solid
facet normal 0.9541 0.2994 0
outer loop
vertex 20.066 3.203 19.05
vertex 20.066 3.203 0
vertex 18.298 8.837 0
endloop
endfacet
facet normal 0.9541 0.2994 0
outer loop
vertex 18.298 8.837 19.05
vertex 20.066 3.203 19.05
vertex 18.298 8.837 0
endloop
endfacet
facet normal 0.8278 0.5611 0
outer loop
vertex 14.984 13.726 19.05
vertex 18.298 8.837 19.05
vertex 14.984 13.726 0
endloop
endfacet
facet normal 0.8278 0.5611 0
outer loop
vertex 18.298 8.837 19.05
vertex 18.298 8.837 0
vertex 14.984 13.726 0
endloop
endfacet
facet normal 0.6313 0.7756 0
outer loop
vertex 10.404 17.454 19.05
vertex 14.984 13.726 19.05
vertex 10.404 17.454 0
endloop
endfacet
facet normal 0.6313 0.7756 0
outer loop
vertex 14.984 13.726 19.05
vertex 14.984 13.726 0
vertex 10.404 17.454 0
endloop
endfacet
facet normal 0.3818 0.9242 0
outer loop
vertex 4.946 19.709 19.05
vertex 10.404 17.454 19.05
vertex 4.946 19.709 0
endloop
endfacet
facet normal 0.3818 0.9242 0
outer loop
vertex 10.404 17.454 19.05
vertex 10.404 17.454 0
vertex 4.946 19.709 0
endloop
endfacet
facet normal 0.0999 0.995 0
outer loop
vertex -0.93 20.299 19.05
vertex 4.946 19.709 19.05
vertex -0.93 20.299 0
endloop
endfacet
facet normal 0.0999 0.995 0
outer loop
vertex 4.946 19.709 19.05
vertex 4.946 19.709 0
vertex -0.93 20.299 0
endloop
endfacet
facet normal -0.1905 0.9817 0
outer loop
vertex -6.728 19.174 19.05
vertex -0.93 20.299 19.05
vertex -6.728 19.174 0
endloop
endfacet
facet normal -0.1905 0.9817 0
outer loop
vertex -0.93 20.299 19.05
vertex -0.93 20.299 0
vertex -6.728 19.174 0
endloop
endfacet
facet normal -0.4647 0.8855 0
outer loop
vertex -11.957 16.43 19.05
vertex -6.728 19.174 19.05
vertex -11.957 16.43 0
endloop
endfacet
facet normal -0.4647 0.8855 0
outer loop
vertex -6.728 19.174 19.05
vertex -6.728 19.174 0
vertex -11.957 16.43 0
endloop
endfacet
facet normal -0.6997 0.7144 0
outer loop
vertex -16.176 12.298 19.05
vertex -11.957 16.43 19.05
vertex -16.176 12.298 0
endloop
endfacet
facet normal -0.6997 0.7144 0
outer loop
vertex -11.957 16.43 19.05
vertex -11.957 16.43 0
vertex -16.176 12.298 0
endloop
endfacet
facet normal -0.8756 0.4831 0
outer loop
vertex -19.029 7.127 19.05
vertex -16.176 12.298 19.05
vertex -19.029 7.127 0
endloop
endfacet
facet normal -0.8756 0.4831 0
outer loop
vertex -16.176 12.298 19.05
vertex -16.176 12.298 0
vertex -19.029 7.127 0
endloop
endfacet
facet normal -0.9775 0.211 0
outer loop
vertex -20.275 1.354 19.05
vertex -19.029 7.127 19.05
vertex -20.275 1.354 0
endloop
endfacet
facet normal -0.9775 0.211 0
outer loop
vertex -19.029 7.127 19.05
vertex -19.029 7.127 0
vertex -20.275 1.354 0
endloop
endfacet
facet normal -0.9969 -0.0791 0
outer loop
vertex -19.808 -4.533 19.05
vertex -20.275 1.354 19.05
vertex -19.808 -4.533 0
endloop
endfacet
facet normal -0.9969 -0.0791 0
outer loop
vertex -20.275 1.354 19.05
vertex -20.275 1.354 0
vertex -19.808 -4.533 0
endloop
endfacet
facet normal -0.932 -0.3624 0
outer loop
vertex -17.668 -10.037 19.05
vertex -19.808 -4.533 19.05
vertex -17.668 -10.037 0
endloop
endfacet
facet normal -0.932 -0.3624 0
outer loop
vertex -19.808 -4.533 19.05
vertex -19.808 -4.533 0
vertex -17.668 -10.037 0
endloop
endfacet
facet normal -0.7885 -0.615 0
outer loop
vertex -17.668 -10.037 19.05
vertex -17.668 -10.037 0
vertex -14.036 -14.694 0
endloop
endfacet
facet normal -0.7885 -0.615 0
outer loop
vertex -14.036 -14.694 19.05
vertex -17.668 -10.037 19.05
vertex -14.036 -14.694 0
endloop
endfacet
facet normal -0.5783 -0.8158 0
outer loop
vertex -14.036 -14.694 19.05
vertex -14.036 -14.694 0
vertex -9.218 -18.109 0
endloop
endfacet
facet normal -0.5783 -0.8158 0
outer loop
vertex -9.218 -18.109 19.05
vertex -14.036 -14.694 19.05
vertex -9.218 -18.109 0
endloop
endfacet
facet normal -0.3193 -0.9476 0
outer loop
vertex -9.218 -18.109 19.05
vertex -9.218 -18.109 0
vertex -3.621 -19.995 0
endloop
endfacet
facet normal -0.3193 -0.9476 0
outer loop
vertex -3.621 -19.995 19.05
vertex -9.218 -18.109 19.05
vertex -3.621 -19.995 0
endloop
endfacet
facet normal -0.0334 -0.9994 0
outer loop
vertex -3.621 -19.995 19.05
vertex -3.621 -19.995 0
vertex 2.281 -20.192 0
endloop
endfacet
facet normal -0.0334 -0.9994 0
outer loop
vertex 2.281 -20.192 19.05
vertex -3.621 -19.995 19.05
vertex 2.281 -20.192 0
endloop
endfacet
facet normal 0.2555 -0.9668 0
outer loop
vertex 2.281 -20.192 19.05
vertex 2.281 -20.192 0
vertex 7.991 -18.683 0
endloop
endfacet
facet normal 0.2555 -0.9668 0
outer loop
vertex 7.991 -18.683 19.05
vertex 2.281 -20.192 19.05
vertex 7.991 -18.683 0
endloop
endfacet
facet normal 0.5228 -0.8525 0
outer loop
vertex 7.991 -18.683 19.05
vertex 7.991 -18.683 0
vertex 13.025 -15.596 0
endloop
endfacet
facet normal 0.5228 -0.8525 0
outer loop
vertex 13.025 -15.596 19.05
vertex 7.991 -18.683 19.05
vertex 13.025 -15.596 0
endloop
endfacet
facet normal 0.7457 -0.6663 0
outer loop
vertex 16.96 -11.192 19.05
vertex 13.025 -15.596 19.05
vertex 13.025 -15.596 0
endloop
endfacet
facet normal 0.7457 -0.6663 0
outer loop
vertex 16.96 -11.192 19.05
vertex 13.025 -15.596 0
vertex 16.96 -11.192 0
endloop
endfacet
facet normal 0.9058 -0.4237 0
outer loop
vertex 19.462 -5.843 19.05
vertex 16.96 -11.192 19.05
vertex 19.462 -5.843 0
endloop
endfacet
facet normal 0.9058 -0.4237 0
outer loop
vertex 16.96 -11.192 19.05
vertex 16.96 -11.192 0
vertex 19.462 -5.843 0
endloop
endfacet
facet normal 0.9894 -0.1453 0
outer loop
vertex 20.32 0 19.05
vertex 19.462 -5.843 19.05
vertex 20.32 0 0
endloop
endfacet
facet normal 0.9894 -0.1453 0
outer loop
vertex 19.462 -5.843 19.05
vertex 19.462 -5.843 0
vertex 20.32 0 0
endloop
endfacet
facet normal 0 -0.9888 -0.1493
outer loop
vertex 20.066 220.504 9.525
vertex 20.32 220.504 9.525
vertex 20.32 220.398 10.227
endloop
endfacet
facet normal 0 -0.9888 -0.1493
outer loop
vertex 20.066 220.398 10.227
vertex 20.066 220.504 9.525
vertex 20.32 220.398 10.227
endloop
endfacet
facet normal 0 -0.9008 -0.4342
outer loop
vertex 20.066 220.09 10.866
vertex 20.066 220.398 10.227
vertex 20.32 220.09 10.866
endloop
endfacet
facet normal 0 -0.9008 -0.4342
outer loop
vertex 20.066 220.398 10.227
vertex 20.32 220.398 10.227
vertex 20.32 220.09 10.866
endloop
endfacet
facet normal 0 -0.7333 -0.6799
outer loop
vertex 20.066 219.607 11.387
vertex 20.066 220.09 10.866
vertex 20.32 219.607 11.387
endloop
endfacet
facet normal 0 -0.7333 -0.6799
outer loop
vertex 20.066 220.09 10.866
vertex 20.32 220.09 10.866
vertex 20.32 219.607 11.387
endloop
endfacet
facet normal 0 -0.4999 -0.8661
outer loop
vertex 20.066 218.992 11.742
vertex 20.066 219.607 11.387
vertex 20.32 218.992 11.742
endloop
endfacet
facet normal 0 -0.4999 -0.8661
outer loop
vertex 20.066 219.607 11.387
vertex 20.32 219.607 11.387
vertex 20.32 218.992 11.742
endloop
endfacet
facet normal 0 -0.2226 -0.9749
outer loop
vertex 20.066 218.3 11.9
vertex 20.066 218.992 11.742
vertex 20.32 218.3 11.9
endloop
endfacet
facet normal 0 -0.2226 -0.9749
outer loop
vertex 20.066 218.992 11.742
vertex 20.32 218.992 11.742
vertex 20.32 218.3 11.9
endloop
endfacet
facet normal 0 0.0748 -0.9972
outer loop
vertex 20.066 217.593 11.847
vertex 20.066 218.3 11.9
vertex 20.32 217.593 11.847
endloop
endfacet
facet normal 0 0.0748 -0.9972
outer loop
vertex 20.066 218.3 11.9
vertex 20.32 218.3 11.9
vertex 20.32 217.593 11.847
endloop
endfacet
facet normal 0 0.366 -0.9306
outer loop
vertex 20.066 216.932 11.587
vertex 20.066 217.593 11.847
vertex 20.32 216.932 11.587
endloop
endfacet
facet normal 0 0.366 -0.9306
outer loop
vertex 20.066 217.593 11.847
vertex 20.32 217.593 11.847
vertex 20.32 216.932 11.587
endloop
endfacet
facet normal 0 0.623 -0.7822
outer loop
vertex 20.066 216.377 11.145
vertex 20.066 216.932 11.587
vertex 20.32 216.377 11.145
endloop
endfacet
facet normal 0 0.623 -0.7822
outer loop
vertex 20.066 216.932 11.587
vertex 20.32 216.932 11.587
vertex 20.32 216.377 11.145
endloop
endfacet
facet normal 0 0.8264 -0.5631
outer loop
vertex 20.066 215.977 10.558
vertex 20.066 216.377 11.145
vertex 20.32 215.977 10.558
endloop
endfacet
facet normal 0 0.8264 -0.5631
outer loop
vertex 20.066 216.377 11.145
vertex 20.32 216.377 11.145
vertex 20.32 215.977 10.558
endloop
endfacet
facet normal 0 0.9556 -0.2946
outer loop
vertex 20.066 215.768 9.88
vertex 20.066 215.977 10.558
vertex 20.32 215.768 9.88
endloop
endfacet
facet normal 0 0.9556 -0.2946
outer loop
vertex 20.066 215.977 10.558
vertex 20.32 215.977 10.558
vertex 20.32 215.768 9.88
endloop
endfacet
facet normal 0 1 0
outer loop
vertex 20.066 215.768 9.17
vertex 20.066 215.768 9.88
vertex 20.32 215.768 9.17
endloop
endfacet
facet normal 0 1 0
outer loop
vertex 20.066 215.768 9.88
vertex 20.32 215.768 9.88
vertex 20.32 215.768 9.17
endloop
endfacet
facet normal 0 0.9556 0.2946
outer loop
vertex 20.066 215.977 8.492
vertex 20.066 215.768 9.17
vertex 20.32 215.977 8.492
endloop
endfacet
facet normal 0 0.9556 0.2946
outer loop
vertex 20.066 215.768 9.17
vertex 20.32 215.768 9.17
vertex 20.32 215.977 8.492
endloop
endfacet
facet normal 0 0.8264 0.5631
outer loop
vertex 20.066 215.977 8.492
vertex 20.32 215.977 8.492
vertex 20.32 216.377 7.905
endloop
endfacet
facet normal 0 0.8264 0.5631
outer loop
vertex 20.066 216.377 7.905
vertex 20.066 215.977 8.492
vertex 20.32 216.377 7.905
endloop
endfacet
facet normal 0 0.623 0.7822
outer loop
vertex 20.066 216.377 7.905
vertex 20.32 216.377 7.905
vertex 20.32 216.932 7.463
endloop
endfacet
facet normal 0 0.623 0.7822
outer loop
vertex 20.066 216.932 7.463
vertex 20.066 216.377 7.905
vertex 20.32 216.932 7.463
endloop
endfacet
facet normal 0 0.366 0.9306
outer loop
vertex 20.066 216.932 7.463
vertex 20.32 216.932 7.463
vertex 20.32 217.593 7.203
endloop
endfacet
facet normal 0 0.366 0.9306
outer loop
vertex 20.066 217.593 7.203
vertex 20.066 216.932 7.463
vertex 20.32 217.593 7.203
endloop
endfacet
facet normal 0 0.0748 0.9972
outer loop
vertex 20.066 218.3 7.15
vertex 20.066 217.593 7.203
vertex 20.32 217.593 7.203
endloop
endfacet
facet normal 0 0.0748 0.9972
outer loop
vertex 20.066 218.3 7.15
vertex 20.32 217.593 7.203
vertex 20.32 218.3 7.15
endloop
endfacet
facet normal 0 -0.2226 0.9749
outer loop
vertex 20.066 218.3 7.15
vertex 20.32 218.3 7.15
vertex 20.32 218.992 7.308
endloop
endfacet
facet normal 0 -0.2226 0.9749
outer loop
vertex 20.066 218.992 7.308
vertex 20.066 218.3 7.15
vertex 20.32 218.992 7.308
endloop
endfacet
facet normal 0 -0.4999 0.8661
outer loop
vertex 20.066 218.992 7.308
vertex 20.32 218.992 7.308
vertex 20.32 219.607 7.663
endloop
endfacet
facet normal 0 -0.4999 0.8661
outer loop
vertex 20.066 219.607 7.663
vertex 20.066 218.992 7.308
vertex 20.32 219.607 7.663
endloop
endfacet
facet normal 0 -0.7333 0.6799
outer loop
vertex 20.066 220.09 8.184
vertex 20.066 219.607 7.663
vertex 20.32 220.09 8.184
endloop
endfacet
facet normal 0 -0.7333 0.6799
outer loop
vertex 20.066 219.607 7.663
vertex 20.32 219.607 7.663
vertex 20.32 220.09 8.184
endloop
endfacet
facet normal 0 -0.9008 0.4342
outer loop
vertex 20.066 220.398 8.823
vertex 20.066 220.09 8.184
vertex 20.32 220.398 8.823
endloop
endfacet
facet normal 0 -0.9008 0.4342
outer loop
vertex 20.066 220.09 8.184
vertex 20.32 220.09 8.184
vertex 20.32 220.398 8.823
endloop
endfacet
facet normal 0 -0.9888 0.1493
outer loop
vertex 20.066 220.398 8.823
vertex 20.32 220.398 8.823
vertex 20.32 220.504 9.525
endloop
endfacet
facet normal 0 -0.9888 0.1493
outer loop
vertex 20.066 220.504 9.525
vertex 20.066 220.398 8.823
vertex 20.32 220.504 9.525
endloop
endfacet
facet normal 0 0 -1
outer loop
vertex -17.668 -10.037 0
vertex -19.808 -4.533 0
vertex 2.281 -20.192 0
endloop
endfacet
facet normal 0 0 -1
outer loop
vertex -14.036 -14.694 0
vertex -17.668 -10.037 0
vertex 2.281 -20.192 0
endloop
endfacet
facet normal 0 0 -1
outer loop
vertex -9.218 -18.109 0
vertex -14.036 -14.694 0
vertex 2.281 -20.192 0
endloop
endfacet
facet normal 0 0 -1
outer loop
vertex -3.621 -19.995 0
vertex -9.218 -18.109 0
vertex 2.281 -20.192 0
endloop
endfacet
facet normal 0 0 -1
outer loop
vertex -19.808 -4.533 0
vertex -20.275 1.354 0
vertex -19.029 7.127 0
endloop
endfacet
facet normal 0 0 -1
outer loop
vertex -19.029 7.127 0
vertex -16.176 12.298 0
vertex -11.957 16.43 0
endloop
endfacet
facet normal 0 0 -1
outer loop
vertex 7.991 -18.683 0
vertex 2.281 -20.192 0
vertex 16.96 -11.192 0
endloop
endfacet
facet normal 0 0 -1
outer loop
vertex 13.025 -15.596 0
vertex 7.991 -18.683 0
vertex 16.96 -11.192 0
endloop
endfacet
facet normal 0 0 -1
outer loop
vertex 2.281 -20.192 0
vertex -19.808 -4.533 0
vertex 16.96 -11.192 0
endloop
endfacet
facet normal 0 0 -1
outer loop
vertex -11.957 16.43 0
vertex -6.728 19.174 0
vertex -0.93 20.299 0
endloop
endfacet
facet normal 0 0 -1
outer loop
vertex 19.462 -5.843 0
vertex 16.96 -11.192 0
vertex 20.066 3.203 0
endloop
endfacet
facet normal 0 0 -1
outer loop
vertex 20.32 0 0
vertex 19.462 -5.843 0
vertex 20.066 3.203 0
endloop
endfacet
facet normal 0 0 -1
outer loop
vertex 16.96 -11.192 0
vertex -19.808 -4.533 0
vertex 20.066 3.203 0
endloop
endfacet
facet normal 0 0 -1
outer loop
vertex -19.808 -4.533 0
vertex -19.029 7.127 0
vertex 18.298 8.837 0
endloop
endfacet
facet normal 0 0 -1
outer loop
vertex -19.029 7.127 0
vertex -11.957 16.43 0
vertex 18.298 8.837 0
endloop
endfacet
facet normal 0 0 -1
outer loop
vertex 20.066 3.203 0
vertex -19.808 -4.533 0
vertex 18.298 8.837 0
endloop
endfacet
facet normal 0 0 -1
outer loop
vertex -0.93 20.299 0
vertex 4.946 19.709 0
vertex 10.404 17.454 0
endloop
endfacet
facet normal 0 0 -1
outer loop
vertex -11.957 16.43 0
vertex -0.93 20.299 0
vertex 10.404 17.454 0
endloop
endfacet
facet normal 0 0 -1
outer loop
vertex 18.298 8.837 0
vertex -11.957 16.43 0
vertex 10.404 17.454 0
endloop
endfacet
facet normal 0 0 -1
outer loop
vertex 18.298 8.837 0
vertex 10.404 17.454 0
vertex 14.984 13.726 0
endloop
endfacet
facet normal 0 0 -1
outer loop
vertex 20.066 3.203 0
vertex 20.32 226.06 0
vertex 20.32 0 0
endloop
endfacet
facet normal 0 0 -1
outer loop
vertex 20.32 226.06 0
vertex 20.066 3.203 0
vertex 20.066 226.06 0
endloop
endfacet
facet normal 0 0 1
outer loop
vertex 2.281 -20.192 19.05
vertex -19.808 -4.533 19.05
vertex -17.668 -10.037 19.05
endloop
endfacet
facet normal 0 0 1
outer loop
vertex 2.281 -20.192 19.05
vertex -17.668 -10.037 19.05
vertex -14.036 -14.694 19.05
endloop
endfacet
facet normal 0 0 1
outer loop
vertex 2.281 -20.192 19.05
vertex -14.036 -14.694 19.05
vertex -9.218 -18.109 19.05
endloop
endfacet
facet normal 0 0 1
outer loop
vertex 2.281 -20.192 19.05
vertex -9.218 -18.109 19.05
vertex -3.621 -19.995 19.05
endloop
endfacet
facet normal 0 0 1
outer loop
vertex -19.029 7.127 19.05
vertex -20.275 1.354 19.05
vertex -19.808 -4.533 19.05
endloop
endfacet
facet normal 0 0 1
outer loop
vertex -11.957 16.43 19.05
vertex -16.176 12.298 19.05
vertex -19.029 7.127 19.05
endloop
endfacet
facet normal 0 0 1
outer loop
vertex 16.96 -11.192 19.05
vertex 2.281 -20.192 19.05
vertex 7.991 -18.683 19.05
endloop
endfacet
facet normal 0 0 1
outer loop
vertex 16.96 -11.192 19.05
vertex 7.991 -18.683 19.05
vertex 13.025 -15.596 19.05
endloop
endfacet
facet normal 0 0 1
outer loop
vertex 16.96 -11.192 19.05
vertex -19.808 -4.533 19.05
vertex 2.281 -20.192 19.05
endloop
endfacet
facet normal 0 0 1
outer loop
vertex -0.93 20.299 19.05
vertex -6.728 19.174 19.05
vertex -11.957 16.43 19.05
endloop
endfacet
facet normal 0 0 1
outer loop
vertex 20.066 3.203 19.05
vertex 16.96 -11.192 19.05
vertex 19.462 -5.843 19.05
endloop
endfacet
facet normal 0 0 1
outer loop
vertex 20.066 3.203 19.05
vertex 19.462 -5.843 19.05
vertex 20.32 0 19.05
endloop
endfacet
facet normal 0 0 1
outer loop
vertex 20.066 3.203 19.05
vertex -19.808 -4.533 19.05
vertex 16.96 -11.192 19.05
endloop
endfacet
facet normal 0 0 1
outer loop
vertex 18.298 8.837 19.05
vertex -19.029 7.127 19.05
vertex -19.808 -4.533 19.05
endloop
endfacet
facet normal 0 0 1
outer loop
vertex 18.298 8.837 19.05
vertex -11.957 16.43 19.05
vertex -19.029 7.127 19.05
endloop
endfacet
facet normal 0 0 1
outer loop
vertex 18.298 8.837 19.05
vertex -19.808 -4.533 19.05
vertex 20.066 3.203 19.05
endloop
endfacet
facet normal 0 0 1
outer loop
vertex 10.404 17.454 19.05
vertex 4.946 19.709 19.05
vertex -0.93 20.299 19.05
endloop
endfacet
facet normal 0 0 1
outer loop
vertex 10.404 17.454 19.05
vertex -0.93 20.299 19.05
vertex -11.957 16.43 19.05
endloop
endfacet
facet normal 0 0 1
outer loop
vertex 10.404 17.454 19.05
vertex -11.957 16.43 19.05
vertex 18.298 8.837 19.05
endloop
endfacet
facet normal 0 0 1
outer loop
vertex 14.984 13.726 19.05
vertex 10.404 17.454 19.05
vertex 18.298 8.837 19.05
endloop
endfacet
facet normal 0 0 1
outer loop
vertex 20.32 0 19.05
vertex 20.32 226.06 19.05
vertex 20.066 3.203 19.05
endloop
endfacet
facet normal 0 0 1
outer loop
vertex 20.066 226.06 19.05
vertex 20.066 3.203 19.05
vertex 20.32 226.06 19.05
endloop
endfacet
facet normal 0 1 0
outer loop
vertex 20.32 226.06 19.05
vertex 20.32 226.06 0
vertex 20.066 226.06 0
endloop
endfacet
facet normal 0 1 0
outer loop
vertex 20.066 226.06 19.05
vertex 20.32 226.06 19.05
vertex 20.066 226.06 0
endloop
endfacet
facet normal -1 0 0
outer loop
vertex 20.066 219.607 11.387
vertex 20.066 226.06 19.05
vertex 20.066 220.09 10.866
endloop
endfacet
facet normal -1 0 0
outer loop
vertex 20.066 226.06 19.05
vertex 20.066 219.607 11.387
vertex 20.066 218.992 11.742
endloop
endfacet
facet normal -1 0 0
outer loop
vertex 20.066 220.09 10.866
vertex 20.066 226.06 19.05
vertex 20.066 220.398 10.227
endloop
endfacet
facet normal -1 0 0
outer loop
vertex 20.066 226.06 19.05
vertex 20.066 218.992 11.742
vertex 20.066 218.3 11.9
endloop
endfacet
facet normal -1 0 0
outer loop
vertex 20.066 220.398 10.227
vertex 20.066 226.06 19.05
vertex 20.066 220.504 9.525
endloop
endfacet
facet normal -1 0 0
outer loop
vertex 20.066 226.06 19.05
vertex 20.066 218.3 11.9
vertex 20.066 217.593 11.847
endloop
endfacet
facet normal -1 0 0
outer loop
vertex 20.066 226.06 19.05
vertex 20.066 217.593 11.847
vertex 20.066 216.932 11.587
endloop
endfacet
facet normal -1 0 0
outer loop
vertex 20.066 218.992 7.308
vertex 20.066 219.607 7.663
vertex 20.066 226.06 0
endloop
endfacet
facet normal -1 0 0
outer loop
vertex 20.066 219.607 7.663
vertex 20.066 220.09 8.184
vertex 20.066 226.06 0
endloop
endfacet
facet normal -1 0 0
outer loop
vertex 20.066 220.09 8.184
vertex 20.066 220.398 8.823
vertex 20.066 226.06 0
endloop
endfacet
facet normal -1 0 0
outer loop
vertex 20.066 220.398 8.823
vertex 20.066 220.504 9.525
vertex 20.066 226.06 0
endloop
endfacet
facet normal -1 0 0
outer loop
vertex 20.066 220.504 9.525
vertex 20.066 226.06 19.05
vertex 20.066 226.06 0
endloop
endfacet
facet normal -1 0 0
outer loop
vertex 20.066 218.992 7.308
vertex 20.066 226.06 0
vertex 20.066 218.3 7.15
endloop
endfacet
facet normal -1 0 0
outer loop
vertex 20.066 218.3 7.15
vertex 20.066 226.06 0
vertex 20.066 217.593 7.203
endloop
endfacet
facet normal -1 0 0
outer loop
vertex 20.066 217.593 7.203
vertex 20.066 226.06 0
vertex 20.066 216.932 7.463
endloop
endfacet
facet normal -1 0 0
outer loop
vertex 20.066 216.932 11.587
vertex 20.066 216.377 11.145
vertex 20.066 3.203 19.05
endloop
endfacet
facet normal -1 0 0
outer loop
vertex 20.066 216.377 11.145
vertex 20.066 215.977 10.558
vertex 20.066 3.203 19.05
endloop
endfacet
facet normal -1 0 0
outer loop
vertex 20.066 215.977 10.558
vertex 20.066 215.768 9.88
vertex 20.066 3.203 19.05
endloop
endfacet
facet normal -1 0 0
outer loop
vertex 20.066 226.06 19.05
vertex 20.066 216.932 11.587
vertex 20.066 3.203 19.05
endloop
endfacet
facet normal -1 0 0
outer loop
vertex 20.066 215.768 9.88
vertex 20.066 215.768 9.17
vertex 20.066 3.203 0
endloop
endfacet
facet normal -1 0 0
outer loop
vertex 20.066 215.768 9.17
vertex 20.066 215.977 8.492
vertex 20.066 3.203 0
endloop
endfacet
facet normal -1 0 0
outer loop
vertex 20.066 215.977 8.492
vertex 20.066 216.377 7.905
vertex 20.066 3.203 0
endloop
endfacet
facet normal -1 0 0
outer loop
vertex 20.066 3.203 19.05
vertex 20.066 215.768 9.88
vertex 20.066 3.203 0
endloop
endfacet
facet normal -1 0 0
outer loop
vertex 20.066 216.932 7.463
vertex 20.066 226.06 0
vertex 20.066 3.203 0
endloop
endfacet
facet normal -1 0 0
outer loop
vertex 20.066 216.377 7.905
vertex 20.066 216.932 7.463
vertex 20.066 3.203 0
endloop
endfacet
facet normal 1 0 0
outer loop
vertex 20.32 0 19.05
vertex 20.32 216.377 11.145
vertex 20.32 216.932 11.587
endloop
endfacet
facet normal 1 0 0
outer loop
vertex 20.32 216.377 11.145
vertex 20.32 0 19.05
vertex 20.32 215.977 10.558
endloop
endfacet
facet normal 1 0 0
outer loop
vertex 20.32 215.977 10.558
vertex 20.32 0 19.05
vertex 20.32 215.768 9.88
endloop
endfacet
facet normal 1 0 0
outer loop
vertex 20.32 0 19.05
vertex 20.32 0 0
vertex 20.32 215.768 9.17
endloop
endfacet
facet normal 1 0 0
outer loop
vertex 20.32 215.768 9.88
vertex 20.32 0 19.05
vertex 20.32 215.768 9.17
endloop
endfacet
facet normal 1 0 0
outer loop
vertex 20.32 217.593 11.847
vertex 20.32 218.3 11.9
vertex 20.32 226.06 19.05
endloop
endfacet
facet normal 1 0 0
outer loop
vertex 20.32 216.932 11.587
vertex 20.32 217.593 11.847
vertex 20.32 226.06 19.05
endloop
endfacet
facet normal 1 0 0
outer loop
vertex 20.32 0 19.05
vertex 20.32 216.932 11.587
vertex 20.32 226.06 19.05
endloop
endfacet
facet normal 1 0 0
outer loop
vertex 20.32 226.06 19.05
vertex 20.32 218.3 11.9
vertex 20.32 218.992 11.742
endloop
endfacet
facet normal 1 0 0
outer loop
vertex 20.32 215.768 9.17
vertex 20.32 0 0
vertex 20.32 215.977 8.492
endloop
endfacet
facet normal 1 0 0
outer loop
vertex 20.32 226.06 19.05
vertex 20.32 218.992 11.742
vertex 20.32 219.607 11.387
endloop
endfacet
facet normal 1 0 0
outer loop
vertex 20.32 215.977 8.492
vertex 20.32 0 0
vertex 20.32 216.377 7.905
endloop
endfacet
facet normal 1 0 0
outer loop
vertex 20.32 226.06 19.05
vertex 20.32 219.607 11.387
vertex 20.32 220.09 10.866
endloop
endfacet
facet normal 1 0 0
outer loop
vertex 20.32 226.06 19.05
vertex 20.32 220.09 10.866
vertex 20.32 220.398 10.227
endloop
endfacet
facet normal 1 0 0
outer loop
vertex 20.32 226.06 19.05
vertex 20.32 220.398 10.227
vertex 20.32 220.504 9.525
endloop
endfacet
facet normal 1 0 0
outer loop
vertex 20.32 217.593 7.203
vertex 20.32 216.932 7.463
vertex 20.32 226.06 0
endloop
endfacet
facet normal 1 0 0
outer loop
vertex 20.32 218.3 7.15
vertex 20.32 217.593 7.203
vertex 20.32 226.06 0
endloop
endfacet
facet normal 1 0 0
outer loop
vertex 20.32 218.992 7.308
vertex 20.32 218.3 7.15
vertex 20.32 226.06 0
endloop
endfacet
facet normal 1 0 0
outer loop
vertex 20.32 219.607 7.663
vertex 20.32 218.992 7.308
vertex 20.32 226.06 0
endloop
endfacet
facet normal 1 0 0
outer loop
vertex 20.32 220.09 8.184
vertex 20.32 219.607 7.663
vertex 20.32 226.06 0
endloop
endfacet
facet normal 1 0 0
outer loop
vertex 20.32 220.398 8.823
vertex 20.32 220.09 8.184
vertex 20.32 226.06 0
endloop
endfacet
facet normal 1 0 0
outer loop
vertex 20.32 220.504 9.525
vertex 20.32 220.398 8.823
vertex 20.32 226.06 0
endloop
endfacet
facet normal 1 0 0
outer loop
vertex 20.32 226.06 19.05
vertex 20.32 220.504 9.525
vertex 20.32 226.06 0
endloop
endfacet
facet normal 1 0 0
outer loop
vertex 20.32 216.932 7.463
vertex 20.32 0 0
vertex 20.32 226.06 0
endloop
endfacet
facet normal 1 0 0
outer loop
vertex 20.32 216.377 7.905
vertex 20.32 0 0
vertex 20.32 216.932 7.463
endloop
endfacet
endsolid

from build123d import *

# Parameters (mm, degrees)
EXTRUDE1_DEPTH     = 19.05
SKETCH2_R          = 2.38125
CUT_EXTRUDE1_DEPTH = 0.254


with BuildPart() as part:
    # Sketch1 → Extrude1 (new body)
    with BuildSketch(Plane.XY):
        with BuildLine():
            Line((20.32, 0), (20.32, 226.06))
            Line((20.32, 226.06), (20.066, 226.06))
            Line((20.066, 226.06), (20.066, 3.202818134))
            ThreePointArc((20.066, 3.202818134), (-20.25640047, -1.606437051), (20.32, 0))
        make_face()
    extrude(amount=EXTRUDE1_DEPTH)

    # Sketch2 → Cut-Extrude1 (cut)
    with BuildSketch(Plane(origin=(20.32, 0, 0), x_dir=(0, 0, -1), z_dir=(1, 0, 0))):
        with Locations(Location((-9.525, 218.1225, 0), (0, 0, 90))):
            Circle(SKETCH2_R)
    extrude(amount=-CUT_EXTRUDE1_DEPTH, mode=Mode.SUBTRACT)


solid = part.part
